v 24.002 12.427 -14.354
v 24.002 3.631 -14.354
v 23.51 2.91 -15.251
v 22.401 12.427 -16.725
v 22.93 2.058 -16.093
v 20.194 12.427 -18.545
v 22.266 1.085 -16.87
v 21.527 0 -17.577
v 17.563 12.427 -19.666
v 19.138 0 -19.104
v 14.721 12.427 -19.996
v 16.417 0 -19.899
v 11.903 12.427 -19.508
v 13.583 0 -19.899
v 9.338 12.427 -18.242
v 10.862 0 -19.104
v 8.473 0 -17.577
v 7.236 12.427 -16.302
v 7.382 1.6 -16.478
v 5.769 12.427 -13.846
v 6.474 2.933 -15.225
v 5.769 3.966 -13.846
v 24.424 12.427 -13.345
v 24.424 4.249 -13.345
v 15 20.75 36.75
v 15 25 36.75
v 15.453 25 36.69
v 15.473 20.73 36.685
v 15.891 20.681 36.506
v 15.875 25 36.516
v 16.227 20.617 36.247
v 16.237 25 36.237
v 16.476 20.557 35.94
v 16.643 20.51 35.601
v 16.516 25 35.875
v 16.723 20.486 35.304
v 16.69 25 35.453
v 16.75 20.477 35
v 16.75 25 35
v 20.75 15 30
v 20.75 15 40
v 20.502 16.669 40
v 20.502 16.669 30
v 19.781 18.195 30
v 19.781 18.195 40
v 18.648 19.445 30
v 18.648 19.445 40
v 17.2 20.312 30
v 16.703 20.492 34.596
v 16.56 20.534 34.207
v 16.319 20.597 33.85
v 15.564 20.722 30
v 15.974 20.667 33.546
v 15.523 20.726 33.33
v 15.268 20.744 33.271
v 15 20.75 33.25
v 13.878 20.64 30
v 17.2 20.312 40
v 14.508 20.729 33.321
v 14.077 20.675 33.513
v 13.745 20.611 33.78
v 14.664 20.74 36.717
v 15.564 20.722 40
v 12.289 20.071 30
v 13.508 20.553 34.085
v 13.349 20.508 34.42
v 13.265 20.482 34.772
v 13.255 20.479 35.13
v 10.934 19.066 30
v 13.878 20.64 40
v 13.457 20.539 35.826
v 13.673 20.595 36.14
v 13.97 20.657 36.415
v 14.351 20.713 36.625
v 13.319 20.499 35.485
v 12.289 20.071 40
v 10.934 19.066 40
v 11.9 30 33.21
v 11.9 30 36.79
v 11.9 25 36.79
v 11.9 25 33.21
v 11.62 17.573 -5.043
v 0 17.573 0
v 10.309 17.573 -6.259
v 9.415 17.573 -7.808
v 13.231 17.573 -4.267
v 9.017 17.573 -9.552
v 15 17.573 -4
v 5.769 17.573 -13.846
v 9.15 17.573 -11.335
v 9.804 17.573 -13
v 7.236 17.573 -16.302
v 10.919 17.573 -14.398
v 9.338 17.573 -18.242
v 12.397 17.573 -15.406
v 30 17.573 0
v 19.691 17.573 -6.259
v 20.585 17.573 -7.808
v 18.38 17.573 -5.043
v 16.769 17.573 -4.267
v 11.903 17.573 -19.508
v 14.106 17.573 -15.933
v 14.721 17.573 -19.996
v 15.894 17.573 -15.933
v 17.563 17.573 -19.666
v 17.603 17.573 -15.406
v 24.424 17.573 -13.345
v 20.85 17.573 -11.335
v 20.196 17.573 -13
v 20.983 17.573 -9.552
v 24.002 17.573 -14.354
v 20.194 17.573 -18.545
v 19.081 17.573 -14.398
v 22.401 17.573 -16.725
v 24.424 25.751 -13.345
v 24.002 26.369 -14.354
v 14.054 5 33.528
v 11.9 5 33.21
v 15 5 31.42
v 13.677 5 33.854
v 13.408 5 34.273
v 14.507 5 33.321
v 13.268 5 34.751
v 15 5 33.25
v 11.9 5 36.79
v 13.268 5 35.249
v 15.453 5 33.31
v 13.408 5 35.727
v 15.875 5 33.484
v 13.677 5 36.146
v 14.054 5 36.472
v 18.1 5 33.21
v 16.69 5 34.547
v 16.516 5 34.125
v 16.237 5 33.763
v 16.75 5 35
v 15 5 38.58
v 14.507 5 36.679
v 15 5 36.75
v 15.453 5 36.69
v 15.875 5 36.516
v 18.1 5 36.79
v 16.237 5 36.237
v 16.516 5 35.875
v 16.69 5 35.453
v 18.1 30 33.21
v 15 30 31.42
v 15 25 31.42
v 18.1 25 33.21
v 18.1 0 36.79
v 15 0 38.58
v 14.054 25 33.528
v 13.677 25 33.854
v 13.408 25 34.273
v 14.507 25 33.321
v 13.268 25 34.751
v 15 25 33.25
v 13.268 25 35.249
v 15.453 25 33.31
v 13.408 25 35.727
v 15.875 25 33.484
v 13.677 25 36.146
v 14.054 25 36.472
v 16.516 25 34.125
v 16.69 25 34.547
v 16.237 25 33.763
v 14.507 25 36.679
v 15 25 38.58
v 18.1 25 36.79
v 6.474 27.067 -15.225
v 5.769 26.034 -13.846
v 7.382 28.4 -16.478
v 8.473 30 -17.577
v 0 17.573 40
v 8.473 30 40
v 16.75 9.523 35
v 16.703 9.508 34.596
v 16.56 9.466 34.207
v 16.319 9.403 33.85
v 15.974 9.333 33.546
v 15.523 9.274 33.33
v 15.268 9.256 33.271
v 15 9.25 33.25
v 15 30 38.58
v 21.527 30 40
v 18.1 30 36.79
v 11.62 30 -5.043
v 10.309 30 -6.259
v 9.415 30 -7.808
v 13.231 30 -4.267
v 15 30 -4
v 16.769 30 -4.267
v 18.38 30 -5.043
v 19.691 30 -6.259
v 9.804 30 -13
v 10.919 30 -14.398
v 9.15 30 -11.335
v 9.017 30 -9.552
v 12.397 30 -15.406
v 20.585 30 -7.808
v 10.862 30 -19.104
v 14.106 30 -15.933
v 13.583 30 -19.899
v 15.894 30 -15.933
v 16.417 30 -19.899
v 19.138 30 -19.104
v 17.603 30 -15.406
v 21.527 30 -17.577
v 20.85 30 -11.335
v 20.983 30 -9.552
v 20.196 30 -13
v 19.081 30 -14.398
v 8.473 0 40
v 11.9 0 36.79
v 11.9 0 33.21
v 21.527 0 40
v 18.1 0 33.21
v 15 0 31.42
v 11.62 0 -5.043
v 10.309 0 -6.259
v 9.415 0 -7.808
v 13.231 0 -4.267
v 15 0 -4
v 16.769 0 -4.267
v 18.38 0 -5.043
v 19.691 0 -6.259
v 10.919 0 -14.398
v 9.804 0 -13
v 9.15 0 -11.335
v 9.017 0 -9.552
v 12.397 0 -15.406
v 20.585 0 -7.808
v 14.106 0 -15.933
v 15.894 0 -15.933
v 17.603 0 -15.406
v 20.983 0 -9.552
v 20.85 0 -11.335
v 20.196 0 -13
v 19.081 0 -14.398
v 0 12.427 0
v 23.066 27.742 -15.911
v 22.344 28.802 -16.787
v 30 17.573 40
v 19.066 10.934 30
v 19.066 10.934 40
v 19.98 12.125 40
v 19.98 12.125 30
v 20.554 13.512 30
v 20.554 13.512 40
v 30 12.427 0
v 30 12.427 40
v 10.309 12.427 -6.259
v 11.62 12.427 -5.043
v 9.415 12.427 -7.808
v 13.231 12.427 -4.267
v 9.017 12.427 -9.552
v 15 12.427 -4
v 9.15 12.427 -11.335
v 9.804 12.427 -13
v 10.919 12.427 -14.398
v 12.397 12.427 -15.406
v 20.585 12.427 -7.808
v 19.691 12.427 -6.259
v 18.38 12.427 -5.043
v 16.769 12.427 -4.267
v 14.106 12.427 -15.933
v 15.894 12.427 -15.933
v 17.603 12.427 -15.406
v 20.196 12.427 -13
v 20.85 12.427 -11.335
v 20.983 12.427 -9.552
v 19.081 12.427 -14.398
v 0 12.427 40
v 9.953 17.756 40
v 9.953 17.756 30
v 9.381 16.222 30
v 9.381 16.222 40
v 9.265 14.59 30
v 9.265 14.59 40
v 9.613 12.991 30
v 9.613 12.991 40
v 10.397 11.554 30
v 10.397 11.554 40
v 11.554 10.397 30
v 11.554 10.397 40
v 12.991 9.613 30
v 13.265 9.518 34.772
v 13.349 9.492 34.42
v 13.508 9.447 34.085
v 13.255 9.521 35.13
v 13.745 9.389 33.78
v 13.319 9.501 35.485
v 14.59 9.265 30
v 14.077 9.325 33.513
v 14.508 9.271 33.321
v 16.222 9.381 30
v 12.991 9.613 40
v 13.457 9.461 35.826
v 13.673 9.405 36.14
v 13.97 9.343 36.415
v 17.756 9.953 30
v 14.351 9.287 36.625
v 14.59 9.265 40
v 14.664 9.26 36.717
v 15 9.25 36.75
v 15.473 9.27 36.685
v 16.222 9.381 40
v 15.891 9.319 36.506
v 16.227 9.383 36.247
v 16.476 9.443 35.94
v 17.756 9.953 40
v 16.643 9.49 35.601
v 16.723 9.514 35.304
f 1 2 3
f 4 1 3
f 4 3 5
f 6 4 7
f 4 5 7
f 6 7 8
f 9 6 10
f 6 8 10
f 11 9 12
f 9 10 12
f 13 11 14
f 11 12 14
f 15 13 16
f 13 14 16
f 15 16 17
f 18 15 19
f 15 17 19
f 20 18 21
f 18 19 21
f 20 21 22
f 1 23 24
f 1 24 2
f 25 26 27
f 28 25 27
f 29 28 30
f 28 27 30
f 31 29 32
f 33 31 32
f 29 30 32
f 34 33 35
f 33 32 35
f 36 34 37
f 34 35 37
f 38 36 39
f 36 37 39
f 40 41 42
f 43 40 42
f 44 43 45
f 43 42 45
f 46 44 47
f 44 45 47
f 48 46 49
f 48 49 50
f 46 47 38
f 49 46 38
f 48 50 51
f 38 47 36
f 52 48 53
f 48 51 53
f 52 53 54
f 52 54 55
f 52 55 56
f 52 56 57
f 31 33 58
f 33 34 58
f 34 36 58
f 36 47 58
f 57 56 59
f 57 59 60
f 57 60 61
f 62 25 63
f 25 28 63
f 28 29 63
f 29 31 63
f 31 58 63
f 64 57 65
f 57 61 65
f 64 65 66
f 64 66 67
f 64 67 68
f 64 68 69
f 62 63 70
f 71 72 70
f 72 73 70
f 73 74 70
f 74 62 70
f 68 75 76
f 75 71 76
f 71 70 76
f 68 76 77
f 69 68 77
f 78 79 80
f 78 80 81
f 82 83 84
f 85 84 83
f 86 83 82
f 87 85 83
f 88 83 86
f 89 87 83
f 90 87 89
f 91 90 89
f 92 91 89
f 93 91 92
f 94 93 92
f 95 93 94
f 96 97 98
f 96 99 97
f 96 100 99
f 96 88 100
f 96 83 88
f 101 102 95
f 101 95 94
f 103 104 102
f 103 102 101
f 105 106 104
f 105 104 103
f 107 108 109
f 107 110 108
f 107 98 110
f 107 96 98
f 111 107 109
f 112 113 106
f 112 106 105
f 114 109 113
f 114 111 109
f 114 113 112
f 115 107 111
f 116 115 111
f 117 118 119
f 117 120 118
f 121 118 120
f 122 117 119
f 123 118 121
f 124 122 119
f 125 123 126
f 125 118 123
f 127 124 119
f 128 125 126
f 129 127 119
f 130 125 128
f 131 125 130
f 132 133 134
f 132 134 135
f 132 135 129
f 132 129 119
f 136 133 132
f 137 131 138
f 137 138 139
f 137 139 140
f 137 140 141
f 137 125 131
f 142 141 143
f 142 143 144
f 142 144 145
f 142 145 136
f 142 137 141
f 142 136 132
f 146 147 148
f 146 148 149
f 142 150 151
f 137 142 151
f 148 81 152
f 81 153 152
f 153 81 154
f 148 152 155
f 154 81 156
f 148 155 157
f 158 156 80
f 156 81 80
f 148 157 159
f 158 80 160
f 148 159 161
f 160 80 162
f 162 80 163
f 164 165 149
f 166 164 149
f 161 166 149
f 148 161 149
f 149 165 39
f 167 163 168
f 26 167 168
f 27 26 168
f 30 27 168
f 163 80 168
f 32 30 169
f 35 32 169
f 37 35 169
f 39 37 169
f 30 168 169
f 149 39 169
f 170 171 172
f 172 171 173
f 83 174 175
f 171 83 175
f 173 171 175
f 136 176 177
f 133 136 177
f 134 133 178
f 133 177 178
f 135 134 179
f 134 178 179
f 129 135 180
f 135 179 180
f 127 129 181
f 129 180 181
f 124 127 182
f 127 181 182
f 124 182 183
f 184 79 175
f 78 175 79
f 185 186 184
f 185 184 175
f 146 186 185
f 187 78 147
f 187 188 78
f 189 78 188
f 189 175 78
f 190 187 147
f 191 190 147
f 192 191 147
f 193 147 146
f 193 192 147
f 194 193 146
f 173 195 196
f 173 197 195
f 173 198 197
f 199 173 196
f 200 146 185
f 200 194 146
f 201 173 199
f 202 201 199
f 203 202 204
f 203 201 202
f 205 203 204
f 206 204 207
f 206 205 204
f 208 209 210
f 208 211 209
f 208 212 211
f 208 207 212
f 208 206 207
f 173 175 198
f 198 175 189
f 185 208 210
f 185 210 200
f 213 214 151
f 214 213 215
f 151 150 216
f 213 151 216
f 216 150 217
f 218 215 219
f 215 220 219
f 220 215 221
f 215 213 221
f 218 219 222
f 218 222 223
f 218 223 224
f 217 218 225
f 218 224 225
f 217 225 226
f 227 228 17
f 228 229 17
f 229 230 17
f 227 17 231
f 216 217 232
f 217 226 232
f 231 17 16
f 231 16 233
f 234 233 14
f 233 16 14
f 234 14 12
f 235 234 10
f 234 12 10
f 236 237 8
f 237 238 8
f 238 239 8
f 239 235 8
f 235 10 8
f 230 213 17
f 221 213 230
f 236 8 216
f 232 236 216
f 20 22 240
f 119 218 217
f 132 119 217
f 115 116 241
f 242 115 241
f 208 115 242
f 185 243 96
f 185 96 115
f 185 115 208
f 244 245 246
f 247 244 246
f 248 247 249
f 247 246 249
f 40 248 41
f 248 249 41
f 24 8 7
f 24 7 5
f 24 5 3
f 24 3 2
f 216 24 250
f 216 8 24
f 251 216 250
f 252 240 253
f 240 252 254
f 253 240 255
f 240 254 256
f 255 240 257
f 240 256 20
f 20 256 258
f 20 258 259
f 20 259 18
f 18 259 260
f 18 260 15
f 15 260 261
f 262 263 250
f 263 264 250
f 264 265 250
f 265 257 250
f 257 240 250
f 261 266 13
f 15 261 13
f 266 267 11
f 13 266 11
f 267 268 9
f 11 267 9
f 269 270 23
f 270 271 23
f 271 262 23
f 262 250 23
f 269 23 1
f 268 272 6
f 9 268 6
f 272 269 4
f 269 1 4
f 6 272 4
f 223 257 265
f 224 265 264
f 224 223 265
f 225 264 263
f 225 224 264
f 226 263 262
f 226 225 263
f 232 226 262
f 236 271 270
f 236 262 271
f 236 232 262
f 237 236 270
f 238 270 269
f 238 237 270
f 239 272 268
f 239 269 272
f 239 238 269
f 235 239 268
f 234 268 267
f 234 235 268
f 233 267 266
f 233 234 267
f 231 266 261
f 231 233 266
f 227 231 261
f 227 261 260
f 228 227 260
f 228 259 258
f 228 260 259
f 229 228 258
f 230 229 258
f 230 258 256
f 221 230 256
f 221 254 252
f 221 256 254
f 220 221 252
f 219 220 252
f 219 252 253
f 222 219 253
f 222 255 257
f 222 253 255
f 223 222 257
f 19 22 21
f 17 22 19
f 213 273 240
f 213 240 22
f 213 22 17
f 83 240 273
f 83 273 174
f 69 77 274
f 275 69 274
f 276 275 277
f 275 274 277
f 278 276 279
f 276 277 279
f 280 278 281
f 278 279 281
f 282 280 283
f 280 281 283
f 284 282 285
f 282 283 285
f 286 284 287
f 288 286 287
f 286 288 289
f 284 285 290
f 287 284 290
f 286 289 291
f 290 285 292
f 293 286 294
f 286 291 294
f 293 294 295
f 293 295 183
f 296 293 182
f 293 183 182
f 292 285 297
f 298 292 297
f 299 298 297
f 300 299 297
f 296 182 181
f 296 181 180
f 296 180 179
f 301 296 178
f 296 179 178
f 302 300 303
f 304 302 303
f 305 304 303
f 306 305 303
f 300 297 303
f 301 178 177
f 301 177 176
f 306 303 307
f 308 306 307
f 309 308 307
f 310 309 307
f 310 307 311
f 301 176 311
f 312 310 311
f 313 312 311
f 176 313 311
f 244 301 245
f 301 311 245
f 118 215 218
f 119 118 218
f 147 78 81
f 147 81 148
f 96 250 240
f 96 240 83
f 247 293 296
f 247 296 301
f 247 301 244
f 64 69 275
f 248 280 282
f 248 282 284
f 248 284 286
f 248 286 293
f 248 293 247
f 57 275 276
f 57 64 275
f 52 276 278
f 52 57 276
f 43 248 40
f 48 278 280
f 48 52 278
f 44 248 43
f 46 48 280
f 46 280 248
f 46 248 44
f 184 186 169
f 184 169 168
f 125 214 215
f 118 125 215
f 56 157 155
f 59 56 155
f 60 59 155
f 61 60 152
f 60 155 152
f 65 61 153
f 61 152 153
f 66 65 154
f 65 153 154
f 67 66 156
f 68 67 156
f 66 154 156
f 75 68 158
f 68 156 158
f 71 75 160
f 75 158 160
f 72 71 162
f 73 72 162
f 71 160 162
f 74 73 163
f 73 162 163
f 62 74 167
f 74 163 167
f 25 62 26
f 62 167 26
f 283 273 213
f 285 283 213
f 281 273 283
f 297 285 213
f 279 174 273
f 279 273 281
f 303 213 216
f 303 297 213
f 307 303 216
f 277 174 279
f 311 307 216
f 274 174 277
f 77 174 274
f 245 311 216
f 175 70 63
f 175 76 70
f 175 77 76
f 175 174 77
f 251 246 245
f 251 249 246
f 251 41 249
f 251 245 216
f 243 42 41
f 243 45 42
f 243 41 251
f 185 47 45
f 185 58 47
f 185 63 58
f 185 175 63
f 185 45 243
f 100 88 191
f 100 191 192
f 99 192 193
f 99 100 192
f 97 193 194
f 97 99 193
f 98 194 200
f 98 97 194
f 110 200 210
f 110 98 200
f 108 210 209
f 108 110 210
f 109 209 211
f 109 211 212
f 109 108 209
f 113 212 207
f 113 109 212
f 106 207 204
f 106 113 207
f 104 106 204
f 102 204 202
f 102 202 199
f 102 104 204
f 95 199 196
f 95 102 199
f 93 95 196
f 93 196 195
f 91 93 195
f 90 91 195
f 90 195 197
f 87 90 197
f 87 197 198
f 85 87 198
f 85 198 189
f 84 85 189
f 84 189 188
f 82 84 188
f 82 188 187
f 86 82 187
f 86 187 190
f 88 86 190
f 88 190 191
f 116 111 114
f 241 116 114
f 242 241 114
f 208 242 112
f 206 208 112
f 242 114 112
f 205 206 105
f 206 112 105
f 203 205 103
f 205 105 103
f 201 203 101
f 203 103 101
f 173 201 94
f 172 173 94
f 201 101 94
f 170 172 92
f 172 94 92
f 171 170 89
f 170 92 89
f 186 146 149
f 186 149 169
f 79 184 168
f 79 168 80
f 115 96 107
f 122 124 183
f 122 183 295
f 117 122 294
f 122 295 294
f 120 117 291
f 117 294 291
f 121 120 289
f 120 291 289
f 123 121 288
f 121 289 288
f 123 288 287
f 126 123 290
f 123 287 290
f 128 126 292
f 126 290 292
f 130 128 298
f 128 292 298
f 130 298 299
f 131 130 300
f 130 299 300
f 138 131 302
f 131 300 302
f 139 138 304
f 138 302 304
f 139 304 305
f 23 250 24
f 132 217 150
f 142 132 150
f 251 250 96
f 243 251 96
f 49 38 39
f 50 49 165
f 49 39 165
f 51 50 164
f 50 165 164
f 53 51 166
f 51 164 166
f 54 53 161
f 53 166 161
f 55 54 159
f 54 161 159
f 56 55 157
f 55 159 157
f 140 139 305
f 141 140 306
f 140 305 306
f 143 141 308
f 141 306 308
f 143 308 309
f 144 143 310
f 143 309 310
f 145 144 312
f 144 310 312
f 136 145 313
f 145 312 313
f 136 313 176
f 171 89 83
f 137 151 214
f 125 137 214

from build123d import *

# Parameters (mm, degrees)
SKETCH3_W            = 30
SKETCH3_H            = 30
BOSS_EXTRUDE1_DEPTH  = 40
CUT_EXTRUDE1_DEPTH   = 10
CUT_EXTRUDE2_DEPTH   = 5
CUT_EXTRUDE3_DEPTH   = 28
CUT_EXTRUDE4_START   = -40
CUT_EXTRUDE4_DEPTH   = 99.309519017
MIRROR5_START        = -40
MIRROR5_COPY_1_DEPTH = 99.309519017
SKETCH9_R            = 6
BOSS_EXTRUDE2_DEPTH  = 30
CUT_EXTRUDE5_DEPTH   = 30
SKETCH11_W           = 21.329134953
SKETCH11_H           = 5.145955698
CUT_EXTRUDE6_DEPTH   = 30


with BuildPart() as part:
    # Sketch3 → Boss-Extrude1 (new body)
    with BuildSketch(Plane.XY):
        with Locations((15, 15)):
            Rectangle(SKETCH3_W, SKETCH3_H)
    extrude(amount=BOSS_EXTRUDE1_DEPTH)

    # Sketch4 → Cut-Extrude1 (cut)
    with BuildSketch(Plane.XY.offset(40)):
        with BuildLine():
            ThreePointArc((20.75, 15), (17.200429736, 20.312307312), (10.934136008, 19.065863992))
            Line((10.934136008, 19.065863992), (19.065863992, 10.934136008))
            ThreePointArc((19.065863992, 10.934136008), (20.312307312, 12.799570264), (20.75, 15))
        make_face()
        with BuildLine():
            Line((19.065863992, 10.934136008), (10.934136008, 19.065863992))
            ThreePointArc((10.934136008, 19.065863992), (10.934136008, 10.934136008), (19.065863992, 10.934136008))
        make_face()
    extrude(amount=-CUT_EXTRUDE1_DEPTH, mode=Mode.SUBTRACT)

    # Sketch5 → Cut-Extrude2 (cut)
    with BuildSketch(Plane.XZ):
        Polygon((15, 38.58), (11.899629054, 36.79), (11.899629054, 33.21), (15, 31.42), (18.100370946, 33.21), (18.100370946, 36.79), align=None)
    cut_extrude2 = extrude(amount=-CUT_EXTRUDE2_DEPTH, mode=Mode.SUBTRACT)

    # Mirror1: Cut-Extrude2 across plane
    add(cut_extrude2.mirror(Plane(origin=(0, 15, 0), x_dir=(0, 0, 1), z_dir=(0, -1, 0))), mode=Mode.SUBTRACT)

    # Sketch6 → Cut-Extrude3 (cut)
    with BuildSketch(Plane(origin=(0, 25, 0), x_dir=(1, 0, 0), z_dir=(0, 1, 0))):
        with BuildLine():
            ThreePointArc((15, -33.25), (13.25, -35), (15, -36.75))
            Line((15, -36.75), (15, -33.25))
        make_face()
        with BuildLine():
            Line((15, -33.25), (15, -36.75))
            ThreePointArc((15, -36.75), (16.237436867, -36.237436867), (16.75, -35))
            ThreePointArc((16.75, -35), (16.237436867, -33.762563133), (15, -33.25))
        make_face()
    extrude(amount=-CUT_EXTRUDE3_DEPTH, mode=Mode.SUBTRACT)

    # Sketch8 → Cut-Extrude4 (cut)
    with BuildSketch(Plane(origin=(0, 0, 0), x_dir=(-1, 0, 0), z_dir=(0, 0, -1)).offset(CUT_EXTRUDE4_START)):
        Polygon((-77.236567429, -51.703622198), (-30, 17.572977849), (-21.526577959, 30), (25.70998947, 99.276600047), (-112.843210625, 193.749734905), (-215.789767524, 42.769512659), align=None)
    cut_extrude4 = extrude(amount=CUT_EXTRUDE4_DEPTH, mode=Mode.SUBTRACT)

    # Mirror4: Cut-Extrude4 across plane
    add(cut_extrude4.mirror(Plane.ZY.offset(-15)), mode=Mode.SUBTRACT)

    # Mirror5: Cut-Extrude4 across plane
    add(cut_extrude4.mirror(Plane(origin=(0, 15, 0), x_dir=(0, 0, 1), z_dir=(0, -1, 0))), mode=Mode.SUBTRACT)

    # Mirror5 copy 1 sketch → Mirror5 copy 1 (cut)
    with BuildSketch(Plane(origin=(30, 30, 0), x_dir=(1, 0, 0), z_dir=(0, 0, -1)).offset(MIRROR5_START)):
        Polygon((-77.236567429, -51.703622198), (-30, 17.572977849), (-21.526577959, 30), (25.70998947, 99.276600047), (-112.843210625, 193.749734905), (-215.789767524, 42.769512659), align=None)
    extrude(amount=MIRROR5_COPY_1_DEPTH, mode=Mode.SUBTRACT)

    # Sketch9 → Boss-Extrude2 (add)
    with BuildSketch(Plane(origin=(0, 0, 0), x_dir=(1, 0, 0), z_dir=(0, 1, 0))):
        with BuildLine():
            Line((5.769230769, 13.846153846), (0, 0))
            Line((0, 0), (30, 0))
            Line((30, 0), (24.424045098, 13.344753204))
            Line((24.424045098, 13.344753204), (24.002162862, 14.354430365))
            ThreePointArc((24.002162862, 14.354430365), (14.721339861, 19.996116672), (5.769230769, 13.846153846))
        make_face()
        with Locations(Location((15, 10, 0), (0, 0, 270))):
            Circle(SKETCH9_R, mode=Mode.SUBTRACT)
    extrude(amount=BOSS_EXTRUDE2_DEPTH)

    # Sketch10 → Cut-Extrude5 (cut)
    with BuildSketch(Plane.XY):
        Polygon((0, 17.572977849), (8.473422041, 30), (0, 30), align=None)
        Polygon((8.473422041, 0), (0, 0), (0, 12.427022151), align=None)
        Polygon((21.526577959, 0), (30, 12.427022151), (30, 0), align=None)
        Polygon((30, 17.572977849), (21.526577959, 30), (30, 30), align=None)
    extrude(amount=-CUT_EXTRUDE5_DEPTH, mode=Mode.SUBTRACT)

    # Sketch11 → Cut-Extrude6 (cut)
    with BuildSketch(Plane(origin=(30, 0, 0), x_dir=(0, 0, -1), z_dir=(1, 0, 0))):
        with Locations((10.664567477, 15)):
            Rectangle(SKETCH11_W, SKETCH11_H)
    extrude(amount=-CUT_EXTRUDE6_DEPTH, mode=Mode.SUBTRACT)


solid = part.part
